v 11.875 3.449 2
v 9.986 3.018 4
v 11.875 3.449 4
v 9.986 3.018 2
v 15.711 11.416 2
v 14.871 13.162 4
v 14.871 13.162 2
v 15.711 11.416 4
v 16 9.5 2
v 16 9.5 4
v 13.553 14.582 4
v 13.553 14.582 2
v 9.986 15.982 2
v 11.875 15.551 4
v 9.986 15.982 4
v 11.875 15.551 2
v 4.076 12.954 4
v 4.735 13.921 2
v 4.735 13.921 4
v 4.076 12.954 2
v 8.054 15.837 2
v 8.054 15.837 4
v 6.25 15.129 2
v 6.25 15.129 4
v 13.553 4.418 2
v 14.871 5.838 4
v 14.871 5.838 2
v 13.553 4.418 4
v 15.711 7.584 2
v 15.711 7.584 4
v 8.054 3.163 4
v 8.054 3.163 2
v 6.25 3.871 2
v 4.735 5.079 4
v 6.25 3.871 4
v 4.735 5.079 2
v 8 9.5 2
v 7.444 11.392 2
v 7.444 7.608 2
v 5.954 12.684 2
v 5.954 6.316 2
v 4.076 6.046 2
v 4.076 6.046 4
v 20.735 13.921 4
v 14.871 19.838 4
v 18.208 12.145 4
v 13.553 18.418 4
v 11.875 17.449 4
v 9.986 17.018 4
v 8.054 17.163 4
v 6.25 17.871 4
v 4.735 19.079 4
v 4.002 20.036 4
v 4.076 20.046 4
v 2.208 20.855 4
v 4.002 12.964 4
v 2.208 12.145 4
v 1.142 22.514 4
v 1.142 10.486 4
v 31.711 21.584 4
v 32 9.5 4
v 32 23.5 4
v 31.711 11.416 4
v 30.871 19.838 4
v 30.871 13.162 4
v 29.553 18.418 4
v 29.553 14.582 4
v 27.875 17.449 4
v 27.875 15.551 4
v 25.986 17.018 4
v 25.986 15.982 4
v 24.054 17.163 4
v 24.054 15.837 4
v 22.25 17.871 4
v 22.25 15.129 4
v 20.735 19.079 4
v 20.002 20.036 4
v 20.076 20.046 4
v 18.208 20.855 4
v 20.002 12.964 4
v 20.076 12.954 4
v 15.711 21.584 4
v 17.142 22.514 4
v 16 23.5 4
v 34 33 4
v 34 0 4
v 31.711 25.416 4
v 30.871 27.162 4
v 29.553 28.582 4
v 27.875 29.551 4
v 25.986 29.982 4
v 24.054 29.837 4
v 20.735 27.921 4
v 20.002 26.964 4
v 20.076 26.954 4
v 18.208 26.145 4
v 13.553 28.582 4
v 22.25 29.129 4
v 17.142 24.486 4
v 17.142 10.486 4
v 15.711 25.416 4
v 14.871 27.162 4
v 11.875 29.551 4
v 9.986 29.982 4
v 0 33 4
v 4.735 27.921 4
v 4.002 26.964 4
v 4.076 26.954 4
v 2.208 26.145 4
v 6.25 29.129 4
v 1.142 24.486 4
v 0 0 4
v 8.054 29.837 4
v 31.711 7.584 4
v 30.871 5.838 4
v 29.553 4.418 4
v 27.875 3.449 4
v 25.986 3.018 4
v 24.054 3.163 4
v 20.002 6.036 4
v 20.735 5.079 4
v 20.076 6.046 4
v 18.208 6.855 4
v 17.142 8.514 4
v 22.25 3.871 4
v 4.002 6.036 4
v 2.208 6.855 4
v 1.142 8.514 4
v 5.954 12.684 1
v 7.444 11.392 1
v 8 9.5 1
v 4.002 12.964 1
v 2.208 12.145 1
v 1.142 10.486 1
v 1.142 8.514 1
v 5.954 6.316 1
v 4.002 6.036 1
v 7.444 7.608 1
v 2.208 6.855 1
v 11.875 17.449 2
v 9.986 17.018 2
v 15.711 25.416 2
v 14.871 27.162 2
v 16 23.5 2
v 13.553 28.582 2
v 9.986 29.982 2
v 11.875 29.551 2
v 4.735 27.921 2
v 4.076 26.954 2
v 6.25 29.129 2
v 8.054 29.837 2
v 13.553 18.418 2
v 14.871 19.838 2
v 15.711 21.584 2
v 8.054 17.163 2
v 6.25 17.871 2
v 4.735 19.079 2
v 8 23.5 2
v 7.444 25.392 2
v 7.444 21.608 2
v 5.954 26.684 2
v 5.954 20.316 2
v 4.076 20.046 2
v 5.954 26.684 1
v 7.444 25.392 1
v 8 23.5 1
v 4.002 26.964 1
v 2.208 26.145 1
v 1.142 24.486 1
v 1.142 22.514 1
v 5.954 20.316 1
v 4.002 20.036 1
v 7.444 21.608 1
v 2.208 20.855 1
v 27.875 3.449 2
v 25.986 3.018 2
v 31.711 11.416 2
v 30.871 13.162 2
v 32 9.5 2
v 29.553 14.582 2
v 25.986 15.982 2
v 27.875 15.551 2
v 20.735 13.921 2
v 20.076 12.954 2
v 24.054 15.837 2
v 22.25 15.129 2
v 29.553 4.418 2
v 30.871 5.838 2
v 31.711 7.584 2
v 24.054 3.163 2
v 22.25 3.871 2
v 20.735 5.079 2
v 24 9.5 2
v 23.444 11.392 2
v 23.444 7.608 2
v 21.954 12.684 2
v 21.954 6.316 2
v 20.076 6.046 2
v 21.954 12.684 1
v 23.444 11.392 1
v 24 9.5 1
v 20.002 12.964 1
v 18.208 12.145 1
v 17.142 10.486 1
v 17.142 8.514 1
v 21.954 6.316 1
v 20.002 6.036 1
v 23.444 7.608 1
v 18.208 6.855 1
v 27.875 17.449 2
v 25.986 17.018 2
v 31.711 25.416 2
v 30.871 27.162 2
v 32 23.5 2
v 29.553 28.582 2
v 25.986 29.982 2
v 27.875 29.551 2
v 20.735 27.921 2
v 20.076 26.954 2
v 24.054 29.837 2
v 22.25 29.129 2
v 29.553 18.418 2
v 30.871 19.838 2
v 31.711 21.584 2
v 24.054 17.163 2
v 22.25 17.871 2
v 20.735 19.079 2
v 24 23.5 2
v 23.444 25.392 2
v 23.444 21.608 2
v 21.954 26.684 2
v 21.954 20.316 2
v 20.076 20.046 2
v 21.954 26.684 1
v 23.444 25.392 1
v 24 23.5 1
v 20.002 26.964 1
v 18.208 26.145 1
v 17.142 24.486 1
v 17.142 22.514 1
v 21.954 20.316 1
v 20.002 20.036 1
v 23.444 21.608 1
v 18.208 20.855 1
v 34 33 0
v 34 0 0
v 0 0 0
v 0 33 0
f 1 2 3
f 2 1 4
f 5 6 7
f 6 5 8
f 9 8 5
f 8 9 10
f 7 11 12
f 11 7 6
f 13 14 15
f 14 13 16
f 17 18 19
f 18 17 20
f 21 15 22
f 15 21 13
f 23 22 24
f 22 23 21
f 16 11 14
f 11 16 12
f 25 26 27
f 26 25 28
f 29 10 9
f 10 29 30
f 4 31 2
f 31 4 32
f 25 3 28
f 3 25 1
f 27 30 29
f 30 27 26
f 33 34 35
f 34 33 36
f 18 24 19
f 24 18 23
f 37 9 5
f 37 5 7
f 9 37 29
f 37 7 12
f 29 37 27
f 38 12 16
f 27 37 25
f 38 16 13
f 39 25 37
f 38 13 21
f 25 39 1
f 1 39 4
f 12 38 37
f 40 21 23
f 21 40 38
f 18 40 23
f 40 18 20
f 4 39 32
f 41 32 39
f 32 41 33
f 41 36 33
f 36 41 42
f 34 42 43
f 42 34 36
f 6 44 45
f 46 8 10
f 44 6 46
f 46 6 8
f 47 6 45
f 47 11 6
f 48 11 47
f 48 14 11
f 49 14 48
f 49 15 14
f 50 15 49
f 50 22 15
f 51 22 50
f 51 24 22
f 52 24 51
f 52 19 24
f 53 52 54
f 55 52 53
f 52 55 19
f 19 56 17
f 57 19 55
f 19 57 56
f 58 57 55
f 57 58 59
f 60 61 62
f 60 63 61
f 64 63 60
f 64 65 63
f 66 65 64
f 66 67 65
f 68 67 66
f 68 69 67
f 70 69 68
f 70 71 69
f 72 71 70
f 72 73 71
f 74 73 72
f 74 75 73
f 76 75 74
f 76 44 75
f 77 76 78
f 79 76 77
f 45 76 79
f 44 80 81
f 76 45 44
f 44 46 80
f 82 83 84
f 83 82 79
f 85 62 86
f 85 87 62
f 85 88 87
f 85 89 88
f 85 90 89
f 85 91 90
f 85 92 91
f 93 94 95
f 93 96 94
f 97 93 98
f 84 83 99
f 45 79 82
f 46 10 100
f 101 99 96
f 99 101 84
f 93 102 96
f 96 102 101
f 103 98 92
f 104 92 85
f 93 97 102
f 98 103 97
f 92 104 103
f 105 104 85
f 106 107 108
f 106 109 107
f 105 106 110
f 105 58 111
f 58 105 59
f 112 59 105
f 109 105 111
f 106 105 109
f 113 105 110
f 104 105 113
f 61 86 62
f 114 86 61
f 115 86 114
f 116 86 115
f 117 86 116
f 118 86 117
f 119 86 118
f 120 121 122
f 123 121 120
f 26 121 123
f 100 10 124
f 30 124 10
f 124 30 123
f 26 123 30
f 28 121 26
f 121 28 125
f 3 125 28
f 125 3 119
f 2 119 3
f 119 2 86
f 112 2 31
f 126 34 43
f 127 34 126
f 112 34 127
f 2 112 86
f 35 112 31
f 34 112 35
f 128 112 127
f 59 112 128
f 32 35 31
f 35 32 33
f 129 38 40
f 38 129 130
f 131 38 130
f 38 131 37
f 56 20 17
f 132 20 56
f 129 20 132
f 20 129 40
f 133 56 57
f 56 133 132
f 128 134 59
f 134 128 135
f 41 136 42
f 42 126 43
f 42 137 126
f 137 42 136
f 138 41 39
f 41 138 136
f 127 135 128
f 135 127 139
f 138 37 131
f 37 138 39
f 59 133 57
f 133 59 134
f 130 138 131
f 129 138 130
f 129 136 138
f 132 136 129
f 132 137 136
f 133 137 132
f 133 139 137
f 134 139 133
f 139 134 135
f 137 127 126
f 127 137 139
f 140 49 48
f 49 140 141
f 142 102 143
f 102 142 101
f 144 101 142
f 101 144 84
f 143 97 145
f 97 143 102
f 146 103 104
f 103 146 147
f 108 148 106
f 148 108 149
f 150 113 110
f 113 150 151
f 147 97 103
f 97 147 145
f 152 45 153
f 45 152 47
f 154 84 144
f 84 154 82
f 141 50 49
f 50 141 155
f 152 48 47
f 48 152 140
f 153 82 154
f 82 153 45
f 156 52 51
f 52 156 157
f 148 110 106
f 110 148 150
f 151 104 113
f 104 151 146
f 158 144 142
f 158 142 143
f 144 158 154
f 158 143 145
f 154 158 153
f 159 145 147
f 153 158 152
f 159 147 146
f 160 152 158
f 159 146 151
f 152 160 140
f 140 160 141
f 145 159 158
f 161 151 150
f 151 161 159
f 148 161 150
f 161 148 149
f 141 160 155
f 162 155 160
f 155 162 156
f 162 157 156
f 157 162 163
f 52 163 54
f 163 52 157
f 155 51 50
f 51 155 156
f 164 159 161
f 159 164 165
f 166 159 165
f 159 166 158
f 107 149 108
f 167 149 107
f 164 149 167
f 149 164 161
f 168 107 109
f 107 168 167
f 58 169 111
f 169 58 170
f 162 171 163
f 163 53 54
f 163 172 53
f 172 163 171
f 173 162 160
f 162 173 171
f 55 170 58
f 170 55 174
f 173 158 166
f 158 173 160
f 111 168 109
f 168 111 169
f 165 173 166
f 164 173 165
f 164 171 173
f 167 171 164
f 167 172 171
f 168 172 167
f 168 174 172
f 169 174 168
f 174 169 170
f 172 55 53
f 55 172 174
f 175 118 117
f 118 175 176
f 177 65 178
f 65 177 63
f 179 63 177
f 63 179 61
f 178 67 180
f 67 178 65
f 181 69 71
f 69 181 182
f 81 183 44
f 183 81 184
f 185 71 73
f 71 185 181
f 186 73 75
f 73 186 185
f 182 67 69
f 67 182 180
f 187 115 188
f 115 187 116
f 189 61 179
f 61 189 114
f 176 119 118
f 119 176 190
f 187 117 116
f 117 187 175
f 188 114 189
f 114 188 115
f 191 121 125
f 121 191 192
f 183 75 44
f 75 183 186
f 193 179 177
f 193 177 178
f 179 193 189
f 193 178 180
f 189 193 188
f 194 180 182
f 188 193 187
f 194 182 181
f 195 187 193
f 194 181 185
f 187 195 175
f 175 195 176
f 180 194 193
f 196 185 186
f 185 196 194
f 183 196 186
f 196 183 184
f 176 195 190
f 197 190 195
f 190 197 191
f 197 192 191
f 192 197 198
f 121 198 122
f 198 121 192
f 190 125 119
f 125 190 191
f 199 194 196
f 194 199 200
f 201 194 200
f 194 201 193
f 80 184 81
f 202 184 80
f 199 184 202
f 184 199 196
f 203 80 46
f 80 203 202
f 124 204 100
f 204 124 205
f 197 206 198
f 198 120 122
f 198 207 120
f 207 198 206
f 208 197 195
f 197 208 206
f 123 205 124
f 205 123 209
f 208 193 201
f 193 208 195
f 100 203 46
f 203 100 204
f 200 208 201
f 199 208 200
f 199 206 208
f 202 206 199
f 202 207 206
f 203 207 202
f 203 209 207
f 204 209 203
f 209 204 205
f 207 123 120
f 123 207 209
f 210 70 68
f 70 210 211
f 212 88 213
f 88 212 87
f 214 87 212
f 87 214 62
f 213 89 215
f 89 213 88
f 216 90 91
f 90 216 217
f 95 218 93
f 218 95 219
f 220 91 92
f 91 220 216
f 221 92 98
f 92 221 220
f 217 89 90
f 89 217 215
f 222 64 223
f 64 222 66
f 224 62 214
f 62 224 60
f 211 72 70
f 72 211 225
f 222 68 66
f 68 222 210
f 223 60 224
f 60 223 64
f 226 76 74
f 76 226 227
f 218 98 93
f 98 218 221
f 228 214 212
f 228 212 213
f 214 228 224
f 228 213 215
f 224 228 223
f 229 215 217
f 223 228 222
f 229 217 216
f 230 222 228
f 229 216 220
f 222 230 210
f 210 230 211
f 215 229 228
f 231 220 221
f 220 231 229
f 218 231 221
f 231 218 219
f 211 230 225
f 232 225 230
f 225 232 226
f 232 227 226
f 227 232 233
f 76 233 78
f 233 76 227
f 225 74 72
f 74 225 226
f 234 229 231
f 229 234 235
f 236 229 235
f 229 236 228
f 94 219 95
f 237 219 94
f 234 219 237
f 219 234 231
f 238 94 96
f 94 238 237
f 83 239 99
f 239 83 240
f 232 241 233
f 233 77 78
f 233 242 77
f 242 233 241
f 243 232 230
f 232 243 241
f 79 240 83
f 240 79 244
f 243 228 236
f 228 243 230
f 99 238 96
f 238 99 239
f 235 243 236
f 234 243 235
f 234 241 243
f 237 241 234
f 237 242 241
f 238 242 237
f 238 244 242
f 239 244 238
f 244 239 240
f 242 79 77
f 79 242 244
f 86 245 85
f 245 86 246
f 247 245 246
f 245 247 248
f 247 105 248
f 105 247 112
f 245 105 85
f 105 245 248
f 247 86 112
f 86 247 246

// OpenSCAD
height = 4;

tokenHeight = 2;
tokenDiameter = 13;
notchHeight = 3;
notchDiameter = 7;

rowsOfCircles = 2;
columnsOfCircles = 2; //must be even

spaceBetweenCircles = 1;
extraSpaceBetweenRows = 2;
spaceFromSide = 3;
extraPaddingForMagnet = 0;

length = 34;
width = 33;

echo ("length");
echo(length);
echo("width");
echo (width);

difference() {
    cube([length, width, height]);
    for(columnIndex=[0:columnsOfCircles/2 - 1]) {
        for(rowIndex=[0:rowsOfCircles - 1]) {
            translate([
                (tokenDiameter + spaceBetweenCircles + extraSpaceBetweenRows) * columnIndex + tokenDiameter/2 + spaceFromSide,
                (tokenDiameter + spaceBetweenCircles) * rowIndex + tokenDiameter/2 + spaceFromSide,
                height - tokenHeight])
                cylinder(tokenHeight, d=tokenDiameter);
            translate([
                (tokenDiameter + spaceBetweenCircles + extraSpaceBetweenRows) * columnIndex + tokenDiameter/2 + spaceFromSide - 5,
                (tokenDiameter + spaceBetweenCircles) * rowIndex + tokenDiameter/2 + spaceFromSide,
                height - notchHeight])
                cylinder(notchHeight, d=notchDiameter);
        }
    }
    
    for(columnIndex=[columnsOfCircles/2: columnsOfCircles - 1]) {
        for(rowIndex=[0:rowsOfCircles - 1]) {
            translate([
                (tokenDiameter + spaceBetweenCircles + extraSpaceBetweenRows) * columnIndex + tokenDiameter/2 + spaceFromSide + extraPaddingForMagnet,
                (tokenDiameter + spaceBetweenCircles) * rowIndex + tokenDiameter/2 + spaceFromSide,
                height - tokenHeight])
                cylinder(tokenHeight, d=tokenDiameter);
            translate([
                (tokenDiameter + spaceBetweenCircles + extraSpaceBetweenRows) * columnIndex + tokenDiameter/2 + spaceFromSide + extraPaddingForMagnet - 5 ,
                (tokenDiameter + spaceBetweenCircles) * rowIndex + tokenDiameter/2 + spaceFromSide,
                height - notchHeight])
                cylinder(notchHeight, d=notchDiameter);
        }
    }

}
